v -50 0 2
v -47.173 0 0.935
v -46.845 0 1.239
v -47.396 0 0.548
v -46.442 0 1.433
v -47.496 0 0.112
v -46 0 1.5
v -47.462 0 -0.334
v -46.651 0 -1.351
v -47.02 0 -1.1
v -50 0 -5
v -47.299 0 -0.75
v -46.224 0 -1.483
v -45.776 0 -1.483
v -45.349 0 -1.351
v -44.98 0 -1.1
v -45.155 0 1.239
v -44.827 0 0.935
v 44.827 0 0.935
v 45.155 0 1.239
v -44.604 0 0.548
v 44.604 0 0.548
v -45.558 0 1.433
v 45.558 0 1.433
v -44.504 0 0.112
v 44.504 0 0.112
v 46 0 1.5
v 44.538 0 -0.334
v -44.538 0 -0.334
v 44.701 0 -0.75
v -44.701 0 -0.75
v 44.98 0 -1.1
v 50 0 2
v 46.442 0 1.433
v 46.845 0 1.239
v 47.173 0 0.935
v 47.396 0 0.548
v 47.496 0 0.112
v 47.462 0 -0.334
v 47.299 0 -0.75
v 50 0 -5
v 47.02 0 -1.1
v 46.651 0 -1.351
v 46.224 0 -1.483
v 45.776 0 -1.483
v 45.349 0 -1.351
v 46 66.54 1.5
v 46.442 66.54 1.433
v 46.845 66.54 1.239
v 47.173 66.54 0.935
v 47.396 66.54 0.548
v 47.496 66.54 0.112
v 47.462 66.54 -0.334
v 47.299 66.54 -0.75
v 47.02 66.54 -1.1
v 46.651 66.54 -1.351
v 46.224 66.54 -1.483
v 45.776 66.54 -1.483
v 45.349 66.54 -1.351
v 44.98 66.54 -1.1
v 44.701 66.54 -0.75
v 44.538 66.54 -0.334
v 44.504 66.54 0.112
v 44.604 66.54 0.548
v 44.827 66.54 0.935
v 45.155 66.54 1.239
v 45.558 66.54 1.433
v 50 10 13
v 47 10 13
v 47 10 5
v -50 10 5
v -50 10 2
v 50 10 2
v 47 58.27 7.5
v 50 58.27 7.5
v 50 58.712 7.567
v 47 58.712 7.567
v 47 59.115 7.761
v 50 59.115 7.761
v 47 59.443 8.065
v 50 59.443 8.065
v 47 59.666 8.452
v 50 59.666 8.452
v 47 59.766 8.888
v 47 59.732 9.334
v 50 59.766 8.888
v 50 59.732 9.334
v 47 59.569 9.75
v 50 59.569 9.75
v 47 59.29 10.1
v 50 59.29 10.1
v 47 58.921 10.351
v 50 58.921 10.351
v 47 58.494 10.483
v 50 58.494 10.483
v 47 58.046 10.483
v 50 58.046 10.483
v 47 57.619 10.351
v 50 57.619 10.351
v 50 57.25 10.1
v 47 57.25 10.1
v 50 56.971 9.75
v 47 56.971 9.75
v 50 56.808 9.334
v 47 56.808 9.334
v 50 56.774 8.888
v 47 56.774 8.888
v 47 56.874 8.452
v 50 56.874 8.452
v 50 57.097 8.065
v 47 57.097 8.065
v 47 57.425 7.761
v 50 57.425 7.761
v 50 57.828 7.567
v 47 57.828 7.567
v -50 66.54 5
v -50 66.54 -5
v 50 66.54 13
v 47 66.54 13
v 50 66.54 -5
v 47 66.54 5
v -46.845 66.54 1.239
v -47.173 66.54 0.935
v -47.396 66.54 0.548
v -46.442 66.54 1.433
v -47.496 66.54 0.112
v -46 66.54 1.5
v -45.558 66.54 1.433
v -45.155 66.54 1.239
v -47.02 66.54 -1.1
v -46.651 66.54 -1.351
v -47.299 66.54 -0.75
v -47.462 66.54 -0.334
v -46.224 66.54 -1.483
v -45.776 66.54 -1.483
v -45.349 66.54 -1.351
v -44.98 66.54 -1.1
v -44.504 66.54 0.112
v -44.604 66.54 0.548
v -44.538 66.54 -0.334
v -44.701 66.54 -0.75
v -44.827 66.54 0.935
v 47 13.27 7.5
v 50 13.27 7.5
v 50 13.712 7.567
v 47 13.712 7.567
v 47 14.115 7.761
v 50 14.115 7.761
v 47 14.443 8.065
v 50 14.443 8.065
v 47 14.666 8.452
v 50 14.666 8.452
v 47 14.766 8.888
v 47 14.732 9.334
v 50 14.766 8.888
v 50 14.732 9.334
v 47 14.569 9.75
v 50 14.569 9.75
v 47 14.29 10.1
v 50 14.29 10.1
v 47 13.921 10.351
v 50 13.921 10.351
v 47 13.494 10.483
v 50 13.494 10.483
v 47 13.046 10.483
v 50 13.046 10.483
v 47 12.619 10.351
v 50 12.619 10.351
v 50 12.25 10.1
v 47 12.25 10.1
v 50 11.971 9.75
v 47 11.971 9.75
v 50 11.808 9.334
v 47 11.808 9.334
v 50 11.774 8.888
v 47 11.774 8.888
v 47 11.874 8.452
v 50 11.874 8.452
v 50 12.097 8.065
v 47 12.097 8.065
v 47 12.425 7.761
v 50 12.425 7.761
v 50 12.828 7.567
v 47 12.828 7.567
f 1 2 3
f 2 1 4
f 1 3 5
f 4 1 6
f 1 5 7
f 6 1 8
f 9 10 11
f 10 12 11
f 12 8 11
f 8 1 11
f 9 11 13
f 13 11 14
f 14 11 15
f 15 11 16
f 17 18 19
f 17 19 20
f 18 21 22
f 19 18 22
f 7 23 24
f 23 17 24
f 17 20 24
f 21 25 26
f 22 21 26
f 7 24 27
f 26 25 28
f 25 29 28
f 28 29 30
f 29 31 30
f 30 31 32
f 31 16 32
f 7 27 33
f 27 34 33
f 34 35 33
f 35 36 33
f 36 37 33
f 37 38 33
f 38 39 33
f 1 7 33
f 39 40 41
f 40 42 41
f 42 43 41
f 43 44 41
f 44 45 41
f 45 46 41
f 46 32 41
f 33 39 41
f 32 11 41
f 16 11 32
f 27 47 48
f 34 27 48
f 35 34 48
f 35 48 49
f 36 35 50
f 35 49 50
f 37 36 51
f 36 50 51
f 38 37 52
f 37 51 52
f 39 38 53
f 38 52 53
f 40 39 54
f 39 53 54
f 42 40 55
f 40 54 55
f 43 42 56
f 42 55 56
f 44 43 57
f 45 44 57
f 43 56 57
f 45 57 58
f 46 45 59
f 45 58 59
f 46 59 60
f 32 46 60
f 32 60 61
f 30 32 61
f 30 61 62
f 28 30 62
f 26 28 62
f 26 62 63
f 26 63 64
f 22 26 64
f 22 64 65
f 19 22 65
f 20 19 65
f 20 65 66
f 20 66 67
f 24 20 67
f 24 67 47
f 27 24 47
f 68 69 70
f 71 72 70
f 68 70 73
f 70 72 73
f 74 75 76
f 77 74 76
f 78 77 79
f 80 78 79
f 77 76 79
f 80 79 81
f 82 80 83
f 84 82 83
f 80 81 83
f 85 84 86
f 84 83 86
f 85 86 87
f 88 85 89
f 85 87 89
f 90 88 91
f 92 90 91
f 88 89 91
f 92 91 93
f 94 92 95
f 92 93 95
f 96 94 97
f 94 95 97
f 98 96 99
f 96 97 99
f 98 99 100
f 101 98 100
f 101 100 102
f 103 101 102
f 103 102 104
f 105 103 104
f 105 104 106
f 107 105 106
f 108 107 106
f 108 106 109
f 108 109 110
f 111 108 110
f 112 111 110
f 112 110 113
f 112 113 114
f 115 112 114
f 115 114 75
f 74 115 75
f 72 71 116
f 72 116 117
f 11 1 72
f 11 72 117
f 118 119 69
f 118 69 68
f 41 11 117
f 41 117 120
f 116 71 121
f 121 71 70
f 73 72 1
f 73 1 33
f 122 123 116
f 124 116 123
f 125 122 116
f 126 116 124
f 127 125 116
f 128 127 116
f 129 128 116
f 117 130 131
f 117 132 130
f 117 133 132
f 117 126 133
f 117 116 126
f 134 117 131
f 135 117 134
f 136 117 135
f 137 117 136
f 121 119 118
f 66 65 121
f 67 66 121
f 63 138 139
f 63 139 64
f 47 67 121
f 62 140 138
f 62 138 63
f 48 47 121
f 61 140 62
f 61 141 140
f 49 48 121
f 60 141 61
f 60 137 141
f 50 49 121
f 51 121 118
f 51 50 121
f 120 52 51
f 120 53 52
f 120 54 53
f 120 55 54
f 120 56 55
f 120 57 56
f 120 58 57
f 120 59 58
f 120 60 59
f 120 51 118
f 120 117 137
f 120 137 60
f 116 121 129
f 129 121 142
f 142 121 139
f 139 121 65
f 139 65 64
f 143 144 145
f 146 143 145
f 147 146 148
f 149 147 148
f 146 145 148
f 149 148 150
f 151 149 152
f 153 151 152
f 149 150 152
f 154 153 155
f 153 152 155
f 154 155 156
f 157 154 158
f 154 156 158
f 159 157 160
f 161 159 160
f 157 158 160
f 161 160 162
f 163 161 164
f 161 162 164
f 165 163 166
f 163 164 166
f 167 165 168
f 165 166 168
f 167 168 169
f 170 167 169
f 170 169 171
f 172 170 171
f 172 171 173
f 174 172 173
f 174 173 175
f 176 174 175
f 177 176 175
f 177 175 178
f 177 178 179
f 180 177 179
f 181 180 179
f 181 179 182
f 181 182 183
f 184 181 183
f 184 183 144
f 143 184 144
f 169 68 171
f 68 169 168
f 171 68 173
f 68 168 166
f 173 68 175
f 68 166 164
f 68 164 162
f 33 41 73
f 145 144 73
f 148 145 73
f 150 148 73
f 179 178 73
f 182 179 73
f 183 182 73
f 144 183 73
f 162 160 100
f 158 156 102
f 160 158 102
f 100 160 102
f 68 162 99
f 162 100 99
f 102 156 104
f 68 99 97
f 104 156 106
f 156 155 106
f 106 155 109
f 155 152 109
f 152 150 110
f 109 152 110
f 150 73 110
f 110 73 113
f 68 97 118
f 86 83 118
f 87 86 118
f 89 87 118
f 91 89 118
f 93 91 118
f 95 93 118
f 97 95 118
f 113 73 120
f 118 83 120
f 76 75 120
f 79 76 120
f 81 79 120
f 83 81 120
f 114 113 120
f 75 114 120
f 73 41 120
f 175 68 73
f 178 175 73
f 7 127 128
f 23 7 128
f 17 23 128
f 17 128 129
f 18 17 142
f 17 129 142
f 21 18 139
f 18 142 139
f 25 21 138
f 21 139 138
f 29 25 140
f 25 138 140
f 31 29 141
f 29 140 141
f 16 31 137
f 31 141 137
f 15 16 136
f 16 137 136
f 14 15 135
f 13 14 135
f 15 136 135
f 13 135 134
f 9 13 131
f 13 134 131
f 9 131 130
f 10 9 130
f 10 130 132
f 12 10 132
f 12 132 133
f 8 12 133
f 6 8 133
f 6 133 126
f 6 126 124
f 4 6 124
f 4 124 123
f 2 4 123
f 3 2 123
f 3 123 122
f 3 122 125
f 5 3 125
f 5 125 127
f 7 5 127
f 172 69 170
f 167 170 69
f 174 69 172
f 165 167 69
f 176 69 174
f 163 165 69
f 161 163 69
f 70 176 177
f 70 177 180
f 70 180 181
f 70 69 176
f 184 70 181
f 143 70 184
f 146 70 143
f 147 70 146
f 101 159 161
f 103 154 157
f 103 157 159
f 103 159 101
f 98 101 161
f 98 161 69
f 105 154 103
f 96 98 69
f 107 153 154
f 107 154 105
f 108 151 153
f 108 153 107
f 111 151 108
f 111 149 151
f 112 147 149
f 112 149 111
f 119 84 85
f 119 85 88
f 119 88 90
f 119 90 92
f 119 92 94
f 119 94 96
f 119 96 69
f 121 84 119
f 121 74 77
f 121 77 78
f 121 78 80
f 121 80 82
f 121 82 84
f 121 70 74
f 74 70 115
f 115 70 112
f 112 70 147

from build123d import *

# Parameters (mm, degrees)
SKETCH1_W           = 100
SKETCH1_H           = 10
BOSS_EXTRUDE1_DEPTH = 66.54
CUT_EXTRUDE1_REACH  = 85.382
SKETCH2_R           = 1.5
LPATTERN1_COUNT     = 2
LPATTERN1_PITCH     = 92
SKETCH3_W           = 100
SKETCH3_H           = 10
CUT_EXTRUDE2_DEPTH  = 3
SKETCH4_W           = 3
SKETCH4_H           = 56.54
BOSS_EXTRUDE2_DEPTH = 8
CUT_EXTRUDE3_REACH  = 122.816
SKETCH5_R           = 1.5


with BuildPart() as part:
    # Sketch1 → Boss-Extrude1 (new body)
    with BuildSketch(Plane(origin=(0, 0, 0), x_dir=(1, 0, 0), z_dir=(0, 1, 0))):
        Rectangle(SKETCH1_W, SKETCH1_H)
    extrude(amount=BOSS_EXTRUDE1_DEPTH)

    # Sketch2 → Cut-Extrude1 (cut, up to next)
    with BuildSketch(Plane(origin=(0, 66.54, 0), x_dir=(1, 0, 0), z_dir=(0, 1, 0)), mode=Mode.PRIVATE) as cut_extrude1_sk1:
        with Locations(Location((-46, 0, 0), (0, 0, 270))):
            Circle(SKETCH2_R)
    cut_extrude1_tool1 = extrude(cut_extrude1_sk1.sketch, amount=-CUT_EXTRUDE1_REACH, mode=Mode.PRIVATE) & part.part
    cut_extrude1 = cut_extrude1_tool1.solids().sort_by_distance((-46, 66.54, 0))[0]
    add(cut_extrude1, mode=Mode.SUBTRACT)

    # LPattern1: Cut-Extrude1 ×2
    with Locations(*[(i * LPATTERN1_PITCH, 0, 0) for i in range(1, LPATTERN1_COUNT)]):
        add(cut_extrude1, mode=Mode.SUBTRACT)

    # Sketch3 → Cut-Extrude2 (cut)
    with BuildSketch(Plane.XY.offset(5)):
        with Locations((0, 5)):
            Rectangle(SKETCH3_W, SKETCH3_H)
    extrude(amount=-CUT_EXTRUDE2_DEPTH, mode=Mode.SUBTRACT)

    # Sketch4 → Boss-Extrude2 (add)
    with BuildSketch(Plane.XY.offset(5)):
        with Locations((48.5, 38.27)):
            Rectangle(SKETCH4_W, SKETCH4_H)
    extrude(amount=BOSS_EXTRUDE2_DEPTH)

    # Sketch5 → Cut-Extrude3 (cut, up to next)
    with BuildSketch(Plane(origin=(50, 0, 0), x_dir=(0, 0, -1), z_dir=(1, 0, 0)), mode=Mode.PRIVATE) as cut_extrude3_sk1:
        with Locations((-9, 58.27)):
            Circle(SKETCH5_R)
    cut_extrude3_tool1 = extrude(cut_extrude3_sk1.sketch, amount=-CUT_EXTRUDE3_REACH, mode=Mode.PRIVATE) & part.part
    # Sketch5 → Cut-Extrude3 (cut, up to next)
    with BuildSketch(Plane(origin=(50, 0, 0), x_dir=(0, 0, -1), z_dir=(1, 0, 0)), mode=Mode.PRIVATE) as cut_extrude3_sk2:
        with Locations((-9, 13.27)):
            Circle(SKETCH5_R)
    cut_extrude3_tool2 = extrude(cut_extrude3_sk2.sketch, amount=-CUT_EXTRUDE3_REACH, mode=Mode.PRIVATE) & part.part
    add(cut_extrude3_tool1.solids().sort_by_distance((50, 58.27, 9))[0], mode=Mode.SUBTRACT)
    add(cut_extrude3_tool2.solids().sort_by_distance((50, 13.27, 9))[0], mode=Mode.SUBTRACT)


solid = part.part
